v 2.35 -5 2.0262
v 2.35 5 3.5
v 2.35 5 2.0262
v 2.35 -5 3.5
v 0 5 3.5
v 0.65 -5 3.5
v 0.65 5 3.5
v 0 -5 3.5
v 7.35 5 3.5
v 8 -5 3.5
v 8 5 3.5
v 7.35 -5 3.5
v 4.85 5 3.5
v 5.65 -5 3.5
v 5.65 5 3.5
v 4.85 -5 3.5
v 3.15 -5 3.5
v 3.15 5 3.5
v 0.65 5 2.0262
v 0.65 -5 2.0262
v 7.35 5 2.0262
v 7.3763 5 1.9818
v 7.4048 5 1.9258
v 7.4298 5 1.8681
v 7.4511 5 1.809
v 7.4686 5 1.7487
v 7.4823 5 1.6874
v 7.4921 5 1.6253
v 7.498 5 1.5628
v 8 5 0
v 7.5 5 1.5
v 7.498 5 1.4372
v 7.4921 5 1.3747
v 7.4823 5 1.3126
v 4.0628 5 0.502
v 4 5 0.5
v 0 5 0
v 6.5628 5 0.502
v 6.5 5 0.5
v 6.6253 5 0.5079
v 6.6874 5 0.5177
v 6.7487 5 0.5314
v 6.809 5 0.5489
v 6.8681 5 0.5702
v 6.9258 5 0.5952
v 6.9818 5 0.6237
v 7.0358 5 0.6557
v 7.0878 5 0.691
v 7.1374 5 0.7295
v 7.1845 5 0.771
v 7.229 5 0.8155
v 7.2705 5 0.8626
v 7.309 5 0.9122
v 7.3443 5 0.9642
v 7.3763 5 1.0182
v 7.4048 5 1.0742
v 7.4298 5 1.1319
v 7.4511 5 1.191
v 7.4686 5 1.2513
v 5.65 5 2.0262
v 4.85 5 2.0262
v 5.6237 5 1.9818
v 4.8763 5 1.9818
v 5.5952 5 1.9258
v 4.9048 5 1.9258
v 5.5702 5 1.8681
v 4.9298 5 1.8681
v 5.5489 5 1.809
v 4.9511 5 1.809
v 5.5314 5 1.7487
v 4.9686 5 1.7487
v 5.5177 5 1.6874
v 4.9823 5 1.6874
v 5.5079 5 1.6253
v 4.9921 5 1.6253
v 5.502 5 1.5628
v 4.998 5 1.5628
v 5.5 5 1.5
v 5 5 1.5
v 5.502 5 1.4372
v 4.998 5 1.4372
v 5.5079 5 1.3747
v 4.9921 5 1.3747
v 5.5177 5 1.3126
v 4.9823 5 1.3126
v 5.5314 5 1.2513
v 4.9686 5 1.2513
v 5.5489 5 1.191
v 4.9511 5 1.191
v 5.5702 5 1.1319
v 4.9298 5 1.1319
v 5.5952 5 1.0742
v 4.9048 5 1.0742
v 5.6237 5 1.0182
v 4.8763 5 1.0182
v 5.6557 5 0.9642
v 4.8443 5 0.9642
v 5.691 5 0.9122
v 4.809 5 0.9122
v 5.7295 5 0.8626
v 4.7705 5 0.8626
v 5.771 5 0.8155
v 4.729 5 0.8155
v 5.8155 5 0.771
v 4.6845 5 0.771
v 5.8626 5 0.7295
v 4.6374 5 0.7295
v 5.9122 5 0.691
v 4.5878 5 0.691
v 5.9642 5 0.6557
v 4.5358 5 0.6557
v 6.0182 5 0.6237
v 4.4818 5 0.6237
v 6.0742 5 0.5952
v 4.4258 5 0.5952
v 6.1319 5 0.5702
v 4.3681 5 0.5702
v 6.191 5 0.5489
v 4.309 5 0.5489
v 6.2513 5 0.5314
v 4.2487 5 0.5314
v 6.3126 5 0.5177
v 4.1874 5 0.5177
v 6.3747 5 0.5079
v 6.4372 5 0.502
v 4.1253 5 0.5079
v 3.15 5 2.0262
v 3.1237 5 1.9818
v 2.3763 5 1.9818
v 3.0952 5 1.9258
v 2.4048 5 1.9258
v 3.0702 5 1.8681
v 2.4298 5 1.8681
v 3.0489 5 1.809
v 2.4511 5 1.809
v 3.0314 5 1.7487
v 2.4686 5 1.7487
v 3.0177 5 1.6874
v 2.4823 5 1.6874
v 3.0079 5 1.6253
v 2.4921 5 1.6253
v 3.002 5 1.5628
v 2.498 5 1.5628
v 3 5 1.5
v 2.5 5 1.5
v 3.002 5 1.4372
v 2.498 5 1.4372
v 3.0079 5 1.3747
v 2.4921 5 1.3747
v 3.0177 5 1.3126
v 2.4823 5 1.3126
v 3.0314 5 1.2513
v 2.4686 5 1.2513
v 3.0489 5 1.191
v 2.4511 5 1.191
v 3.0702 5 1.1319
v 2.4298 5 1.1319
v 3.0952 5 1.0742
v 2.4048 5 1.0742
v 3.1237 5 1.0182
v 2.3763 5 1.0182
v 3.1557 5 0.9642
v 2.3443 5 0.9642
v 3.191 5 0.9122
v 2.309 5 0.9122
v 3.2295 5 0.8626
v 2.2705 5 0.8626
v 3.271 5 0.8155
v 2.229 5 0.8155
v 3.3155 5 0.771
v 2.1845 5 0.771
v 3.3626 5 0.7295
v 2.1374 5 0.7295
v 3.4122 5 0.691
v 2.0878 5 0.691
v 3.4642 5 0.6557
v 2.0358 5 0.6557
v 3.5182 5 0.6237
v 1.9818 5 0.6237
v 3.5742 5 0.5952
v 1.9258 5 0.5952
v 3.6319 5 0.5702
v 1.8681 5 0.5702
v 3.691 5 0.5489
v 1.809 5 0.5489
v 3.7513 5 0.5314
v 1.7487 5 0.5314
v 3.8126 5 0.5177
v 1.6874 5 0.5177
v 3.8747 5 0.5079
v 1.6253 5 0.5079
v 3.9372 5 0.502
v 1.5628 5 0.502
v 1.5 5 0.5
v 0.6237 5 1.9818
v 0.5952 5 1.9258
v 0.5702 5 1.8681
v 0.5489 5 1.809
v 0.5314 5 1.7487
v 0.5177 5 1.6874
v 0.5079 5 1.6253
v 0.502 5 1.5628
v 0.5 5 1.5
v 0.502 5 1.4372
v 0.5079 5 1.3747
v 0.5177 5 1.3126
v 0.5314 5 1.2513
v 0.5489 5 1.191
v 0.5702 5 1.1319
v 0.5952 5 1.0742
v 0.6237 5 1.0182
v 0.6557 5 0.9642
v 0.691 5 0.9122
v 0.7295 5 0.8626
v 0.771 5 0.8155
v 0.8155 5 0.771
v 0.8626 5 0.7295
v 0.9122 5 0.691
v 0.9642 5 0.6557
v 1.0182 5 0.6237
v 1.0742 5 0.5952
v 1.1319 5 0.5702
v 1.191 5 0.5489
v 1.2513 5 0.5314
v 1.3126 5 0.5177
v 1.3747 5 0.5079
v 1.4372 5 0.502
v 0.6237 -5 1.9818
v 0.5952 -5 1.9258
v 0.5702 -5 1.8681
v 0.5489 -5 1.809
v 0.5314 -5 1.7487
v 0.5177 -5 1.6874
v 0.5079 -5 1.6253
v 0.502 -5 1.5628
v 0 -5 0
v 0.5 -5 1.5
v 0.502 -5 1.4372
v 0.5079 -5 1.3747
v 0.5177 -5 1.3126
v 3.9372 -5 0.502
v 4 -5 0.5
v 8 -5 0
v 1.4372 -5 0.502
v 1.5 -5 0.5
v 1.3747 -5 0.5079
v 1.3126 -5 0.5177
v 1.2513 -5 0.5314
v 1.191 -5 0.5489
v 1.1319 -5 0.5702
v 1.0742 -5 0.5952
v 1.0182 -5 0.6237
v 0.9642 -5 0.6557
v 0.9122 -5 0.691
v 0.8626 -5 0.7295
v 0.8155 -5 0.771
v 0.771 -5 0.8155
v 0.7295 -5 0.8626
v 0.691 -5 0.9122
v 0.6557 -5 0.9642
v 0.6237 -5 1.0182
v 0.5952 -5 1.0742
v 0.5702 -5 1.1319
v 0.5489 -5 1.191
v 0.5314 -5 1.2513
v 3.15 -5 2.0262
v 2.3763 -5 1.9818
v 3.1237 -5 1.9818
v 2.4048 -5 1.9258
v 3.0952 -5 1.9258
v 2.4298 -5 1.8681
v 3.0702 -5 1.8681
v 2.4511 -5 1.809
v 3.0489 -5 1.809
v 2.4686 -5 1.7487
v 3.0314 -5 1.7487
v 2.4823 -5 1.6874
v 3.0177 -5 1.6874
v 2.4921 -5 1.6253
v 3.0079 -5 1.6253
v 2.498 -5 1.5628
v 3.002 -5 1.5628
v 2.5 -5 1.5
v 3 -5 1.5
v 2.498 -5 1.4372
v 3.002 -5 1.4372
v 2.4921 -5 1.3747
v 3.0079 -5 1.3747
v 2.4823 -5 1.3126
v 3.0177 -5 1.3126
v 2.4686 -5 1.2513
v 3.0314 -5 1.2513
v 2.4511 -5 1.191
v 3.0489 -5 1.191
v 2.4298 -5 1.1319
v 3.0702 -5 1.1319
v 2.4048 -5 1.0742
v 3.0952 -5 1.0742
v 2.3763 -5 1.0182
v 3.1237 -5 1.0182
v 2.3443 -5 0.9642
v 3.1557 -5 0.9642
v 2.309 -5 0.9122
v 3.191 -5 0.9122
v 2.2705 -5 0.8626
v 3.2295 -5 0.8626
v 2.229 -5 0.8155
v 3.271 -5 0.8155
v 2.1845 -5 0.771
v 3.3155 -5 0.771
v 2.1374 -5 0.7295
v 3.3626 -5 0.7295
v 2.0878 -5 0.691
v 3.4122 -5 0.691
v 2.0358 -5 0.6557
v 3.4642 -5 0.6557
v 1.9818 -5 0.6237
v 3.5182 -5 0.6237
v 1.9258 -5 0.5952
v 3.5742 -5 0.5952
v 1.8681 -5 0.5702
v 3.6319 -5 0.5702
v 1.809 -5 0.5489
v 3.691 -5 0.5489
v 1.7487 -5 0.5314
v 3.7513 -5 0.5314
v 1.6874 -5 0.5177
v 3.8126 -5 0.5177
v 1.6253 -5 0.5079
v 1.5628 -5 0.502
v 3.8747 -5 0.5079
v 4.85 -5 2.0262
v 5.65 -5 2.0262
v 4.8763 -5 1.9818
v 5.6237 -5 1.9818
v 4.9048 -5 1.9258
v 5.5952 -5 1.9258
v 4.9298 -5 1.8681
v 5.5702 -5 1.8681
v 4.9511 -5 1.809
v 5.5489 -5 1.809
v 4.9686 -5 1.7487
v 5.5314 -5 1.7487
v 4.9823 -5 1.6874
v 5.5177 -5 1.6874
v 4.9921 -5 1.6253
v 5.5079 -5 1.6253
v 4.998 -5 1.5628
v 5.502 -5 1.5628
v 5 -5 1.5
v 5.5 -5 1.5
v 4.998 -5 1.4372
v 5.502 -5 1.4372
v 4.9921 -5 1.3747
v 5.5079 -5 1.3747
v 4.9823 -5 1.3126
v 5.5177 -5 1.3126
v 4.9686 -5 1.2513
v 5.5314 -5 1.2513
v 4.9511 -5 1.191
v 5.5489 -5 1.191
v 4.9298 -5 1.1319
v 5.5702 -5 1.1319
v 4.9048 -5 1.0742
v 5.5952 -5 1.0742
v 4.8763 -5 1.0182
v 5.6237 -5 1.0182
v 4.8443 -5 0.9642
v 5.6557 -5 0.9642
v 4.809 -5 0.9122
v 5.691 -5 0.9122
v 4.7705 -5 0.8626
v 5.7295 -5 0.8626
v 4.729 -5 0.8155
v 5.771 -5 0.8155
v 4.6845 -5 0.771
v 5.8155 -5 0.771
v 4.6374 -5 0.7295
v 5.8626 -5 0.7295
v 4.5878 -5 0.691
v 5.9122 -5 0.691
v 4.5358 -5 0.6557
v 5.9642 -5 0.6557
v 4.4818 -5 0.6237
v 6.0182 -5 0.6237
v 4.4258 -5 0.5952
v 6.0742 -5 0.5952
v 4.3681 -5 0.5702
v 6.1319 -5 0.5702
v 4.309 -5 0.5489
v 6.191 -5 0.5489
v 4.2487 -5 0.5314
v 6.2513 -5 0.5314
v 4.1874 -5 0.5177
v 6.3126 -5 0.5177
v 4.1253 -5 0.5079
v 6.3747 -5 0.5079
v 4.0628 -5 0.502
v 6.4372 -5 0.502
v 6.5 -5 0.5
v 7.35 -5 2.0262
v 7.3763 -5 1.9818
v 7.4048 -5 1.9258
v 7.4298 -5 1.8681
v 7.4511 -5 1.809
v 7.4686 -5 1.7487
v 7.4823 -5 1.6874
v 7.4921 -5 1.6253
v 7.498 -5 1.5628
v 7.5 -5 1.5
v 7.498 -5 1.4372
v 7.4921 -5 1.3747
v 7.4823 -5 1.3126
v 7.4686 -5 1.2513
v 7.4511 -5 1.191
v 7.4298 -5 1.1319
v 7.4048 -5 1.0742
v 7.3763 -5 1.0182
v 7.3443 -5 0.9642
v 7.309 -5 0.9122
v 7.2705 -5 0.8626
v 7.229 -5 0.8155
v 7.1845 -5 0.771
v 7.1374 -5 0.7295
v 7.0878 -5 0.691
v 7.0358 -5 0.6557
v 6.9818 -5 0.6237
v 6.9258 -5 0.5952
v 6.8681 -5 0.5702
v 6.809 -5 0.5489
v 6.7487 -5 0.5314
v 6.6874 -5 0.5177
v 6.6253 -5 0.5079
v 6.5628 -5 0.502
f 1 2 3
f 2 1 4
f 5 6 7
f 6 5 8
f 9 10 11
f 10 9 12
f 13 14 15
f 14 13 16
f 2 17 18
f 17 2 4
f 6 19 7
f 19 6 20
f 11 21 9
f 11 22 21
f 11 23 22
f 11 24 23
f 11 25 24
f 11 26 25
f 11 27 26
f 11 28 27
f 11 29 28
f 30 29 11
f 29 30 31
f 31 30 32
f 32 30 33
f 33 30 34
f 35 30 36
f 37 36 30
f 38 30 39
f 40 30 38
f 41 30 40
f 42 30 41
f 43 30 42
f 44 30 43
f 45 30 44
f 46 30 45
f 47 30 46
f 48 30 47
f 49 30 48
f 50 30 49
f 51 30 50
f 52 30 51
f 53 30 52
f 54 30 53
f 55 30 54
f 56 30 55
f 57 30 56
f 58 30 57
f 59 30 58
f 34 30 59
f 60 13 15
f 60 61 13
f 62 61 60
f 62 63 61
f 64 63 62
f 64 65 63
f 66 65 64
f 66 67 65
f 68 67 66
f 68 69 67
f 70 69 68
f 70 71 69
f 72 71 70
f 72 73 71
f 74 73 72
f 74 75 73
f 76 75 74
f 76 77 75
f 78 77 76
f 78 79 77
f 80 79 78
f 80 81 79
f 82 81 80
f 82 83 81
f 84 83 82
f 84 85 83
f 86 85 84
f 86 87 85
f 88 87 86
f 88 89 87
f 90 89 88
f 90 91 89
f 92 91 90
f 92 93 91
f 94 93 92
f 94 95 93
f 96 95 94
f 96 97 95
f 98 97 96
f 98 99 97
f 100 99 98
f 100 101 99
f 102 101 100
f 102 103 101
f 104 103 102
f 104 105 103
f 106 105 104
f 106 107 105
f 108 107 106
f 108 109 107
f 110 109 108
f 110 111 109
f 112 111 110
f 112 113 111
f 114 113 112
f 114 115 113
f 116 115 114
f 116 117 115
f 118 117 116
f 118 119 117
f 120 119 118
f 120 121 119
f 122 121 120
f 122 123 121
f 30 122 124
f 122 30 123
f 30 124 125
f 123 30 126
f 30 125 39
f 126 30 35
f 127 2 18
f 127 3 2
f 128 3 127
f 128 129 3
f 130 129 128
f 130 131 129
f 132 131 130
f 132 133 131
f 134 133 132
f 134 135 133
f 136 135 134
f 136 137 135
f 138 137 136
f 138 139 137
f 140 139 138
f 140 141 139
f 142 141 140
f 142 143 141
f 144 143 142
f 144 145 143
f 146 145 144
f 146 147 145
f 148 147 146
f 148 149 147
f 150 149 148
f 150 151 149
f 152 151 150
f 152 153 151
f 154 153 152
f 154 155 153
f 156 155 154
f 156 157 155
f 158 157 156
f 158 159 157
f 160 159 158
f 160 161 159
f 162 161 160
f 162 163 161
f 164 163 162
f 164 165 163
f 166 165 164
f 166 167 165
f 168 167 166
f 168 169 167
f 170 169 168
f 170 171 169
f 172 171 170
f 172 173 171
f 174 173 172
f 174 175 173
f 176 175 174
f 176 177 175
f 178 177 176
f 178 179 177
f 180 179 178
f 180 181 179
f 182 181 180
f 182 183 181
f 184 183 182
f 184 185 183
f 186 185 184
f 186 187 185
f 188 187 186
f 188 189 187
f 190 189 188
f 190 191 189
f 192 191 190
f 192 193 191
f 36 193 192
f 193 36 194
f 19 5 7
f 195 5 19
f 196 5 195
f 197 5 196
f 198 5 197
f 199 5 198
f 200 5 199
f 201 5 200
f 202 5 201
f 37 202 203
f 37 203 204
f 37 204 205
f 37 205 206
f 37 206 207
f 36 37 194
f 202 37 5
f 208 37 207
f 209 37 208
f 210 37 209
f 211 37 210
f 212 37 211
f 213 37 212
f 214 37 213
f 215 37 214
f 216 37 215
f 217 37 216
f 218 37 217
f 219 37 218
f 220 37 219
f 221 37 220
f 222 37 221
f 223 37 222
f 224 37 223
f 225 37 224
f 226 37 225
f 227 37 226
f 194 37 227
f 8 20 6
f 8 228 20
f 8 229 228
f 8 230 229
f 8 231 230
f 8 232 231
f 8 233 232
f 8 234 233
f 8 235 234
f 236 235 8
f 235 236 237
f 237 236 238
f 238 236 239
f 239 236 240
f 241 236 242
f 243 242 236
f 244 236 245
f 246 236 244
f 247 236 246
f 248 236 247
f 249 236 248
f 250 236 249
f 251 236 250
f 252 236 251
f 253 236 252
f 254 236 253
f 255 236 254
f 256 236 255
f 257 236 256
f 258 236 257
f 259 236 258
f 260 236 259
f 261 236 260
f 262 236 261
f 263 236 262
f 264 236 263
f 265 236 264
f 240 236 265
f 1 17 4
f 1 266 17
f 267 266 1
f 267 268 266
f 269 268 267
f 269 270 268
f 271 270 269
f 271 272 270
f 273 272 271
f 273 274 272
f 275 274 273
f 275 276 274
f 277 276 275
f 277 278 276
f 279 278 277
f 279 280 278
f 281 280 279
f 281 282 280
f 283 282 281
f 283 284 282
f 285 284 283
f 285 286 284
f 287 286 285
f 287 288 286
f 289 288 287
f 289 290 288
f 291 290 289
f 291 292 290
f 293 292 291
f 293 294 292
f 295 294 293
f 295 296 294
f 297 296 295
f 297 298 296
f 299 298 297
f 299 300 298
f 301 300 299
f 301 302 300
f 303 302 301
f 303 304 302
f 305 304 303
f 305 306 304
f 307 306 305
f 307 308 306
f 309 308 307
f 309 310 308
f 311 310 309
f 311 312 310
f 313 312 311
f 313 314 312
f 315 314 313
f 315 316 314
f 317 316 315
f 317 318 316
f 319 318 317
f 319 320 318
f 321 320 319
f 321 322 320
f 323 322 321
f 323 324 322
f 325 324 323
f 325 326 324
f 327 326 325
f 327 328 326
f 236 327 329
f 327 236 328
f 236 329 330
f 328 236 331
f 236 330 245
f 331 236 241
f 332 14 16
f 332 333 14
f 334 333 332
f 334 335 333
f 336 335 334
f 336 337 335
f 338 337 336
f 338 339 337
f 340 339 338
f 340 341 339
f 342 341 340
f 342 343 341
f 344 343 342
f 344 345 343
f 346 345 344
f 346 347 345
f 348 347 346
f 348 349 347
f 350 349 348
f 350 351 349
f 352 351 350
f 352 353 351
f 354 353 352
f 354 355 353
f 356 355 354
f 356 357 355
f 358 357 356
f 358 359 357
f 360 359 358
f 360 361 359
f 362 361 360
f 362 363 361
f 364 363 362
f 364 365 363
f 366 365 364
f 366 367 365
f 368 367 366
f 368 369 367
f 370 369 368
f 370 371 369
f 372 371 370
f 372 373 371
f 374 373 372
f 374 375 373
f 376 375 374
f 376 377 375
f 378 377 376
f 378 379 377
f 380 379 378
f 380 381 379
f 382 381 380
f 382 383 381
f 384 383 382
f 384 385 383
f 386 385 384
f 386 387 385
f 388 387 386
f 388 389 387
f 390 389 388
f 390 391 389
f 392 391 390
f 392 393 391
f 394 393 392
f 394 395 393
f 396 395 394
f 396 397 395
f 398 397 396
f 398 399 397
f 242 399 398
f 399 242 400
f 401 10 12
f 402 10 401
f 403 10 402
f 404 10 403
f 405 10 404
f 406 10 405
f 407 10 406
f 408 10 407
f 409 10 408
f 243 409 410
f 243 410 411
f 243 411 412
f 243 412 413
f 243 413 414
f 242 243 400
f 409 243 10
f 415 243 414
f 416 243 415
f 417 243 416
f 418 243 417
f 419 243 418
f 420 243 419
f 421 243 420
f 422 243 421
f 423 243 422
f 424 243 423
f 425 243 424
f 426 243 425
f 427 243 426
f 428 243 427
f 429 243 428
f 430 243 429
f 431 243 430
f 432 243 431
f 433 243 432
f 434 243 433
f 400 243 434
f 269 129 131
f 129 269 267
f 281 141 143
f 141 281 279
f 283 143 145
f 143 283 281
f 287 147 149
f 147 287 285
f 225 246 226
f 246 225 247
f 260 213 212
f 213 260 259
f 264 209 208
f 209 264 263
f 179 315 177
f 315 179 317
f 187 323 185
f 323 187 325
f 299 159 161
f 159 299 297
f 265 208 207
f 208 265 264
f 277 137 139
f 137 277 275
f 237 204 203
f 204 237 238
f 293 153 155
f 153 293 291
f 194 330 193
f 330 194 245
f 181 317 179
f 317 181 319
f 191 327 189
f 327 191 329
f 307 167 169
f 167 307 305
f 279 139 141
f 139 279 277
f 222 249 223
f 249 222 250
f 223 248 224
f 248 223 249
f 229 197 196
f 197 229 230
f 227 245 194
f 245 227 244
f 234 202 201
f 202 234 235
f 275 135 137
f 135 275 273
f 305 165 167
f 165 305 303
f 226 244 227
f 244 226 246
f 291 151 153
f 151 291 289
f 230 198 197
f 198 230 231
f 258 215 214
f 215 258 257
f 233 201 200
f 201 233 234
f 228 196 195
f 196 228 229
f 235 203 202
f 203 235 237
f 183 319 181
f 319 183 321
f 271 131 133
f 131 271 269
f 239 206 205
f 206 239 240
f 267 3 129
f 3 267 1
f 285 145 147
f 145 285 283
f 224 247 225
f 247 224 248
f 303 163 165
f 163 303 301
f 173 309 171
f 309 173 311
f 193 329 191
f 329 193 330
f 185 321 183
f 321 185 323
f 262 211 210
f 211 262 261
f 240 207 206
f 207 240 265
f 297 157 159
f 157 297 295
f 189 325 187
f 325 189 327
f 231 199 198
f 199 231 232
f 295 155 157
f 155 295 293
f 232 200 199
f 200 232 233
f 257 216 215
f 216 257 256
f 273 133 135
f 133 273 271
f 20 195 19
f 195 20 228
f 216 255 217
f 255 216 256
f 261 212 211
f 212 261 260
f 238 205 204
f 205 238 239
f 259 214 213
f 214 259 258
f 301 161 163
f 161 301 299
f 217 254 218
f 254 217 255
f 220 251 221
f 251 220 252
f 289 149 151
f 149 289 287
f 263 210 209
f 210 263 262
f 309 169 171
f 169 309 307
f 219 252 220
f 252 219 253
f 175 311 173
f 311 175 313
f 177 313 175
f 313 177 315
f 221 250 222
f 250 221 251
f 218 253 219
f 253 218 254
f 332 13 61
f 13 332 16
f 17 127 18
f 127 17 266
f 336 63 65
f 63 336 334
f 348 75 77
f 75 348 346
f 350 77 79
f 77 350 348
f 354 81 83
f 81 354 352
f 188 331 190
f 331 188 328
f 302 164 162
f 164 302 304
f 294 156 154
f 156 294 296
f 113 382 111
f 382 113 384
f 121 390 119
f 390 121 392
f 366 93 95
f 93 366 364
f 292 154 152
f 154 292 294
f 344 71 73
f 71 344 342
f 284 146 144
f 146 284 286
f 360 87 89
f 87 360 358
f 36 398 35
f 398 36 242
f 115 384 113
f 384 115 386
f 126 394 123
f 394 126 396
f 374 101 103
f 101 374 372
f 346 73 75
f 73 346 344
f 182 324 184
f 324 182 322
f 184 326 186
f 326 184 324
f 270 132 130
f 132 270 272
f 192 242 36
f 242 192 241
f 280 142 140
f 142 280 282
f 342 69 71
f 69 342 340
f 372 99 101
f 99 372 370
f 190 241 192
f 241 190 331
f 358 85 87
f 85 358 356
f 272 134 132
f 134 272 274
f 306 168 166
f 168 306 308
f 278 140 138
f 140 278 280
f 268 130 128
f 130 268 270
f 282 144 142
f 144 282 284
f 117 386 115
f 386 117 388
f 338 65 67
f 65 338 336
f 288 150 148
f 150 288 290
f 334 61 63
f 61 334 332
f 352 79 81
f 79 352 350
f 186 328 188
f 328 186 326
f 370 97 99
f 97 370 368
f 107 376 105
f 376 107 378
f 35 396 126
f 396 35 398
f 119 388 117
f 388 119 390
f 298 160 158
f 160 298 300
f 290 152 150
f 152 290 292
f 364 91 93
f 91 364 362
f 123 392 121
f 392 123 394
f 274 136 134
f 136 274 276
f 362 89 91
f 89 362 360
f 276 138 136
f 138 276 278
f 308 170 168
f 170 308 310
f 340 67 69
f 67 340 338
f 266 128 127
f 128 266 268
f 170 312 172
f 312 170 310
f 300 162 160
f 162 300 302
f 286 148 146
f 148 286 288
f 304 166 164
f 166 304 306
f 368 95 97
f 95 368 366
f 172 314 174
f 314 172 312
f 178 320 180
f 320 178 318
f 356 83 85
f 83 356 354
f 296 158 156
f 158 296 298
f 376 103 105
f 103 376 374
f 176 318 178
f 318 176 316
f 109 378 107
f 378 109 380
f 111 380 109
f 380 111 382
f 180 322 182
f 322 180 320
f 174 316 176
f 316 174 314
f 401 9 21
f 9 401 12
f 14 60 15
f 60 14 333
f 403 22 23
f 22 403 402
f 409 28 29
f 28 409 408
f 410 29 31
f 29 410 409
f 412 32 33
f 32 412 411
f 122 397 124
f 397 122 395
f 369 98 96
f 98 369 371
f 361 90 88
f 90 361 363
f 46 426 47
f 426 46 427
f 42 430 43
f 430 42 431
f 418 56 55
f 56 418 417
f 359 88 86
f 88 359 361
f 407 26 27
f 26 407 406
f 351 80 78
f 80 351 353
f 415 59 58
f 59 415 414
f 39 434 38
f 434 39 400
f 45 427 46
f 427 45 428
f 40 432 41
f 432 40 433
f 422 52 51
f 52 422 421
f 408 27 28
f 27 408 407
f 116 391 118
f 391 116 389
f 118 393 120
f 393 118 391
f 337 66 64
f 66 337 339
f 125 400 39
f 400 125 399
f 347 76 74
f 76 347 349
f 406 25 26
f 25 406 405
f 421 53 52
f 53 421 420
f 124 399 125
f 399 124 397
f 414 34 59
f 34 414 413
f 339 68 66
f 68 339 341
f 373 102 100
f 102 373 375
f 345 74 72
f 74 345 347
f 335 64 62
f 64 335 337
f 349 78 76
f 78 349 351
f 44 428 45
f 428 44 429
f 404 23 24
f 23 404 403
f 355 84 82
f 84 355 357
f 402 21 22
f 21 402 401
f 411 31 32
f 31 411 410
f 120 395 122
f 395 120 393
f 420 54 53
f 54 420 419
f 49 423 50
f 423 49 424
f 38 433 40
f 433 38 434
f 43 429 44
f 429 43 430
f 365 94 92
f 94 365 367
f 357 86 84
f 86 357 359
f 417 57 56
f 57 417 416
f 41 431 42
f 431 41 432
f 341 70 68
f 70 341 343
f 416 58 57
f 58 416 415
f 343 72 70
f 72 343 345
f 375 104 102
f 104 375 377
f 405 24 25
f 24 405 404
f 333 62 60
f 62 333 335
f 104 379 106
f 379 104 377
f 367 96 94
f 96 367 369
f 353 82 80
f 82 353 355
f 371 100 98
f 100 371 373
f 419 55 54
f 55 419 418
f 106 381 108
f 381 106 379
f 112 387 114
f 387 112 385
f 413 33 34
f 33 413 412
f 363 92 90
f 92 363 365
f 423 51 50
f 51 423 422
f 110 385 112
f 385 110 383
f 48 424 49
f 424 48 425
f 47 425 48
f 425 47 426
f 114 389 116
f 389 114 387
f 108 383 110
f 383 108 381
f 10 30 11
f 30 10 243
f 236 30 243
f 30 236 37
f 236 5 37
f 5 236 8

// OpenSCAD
// Global Parameters

$fn = 100;

// User Parameters

wire_diameter = 2;
vertical_padding = .5;
horizontal_padding = .5;
pinch_height = 1;
pinch_length = 1.7;

length = 10;
width = 4 * horizontal_padding + 3 * wire_diameter;
height = vertical_padding + wire_diameter + pinch_height;


// Model Generation

module cutout() {
    union() {
        translate([0, 0, wire_diameter / 2]){
            cube([pinch_length, length, pinch_height + wire_diameter / 2], center = true);
        }

        rotate([90, 0, 0]) {
            cylinder(length, d=wire_diameter, center = true);
        }
    }
}

difference() {
    translate([0, -length/2, 0]) {
        cube([width, length, height]);
    }

    for(i = [1 : 3]) {
        echo(i);
        translate([wire_diameter / 2 + horizontal_padding * i + wire_diameter * (i - 1), 
                   0, 
                   wire_diameter / 2 + vertical_padding]) {
            cutout();
        }
    }
}
